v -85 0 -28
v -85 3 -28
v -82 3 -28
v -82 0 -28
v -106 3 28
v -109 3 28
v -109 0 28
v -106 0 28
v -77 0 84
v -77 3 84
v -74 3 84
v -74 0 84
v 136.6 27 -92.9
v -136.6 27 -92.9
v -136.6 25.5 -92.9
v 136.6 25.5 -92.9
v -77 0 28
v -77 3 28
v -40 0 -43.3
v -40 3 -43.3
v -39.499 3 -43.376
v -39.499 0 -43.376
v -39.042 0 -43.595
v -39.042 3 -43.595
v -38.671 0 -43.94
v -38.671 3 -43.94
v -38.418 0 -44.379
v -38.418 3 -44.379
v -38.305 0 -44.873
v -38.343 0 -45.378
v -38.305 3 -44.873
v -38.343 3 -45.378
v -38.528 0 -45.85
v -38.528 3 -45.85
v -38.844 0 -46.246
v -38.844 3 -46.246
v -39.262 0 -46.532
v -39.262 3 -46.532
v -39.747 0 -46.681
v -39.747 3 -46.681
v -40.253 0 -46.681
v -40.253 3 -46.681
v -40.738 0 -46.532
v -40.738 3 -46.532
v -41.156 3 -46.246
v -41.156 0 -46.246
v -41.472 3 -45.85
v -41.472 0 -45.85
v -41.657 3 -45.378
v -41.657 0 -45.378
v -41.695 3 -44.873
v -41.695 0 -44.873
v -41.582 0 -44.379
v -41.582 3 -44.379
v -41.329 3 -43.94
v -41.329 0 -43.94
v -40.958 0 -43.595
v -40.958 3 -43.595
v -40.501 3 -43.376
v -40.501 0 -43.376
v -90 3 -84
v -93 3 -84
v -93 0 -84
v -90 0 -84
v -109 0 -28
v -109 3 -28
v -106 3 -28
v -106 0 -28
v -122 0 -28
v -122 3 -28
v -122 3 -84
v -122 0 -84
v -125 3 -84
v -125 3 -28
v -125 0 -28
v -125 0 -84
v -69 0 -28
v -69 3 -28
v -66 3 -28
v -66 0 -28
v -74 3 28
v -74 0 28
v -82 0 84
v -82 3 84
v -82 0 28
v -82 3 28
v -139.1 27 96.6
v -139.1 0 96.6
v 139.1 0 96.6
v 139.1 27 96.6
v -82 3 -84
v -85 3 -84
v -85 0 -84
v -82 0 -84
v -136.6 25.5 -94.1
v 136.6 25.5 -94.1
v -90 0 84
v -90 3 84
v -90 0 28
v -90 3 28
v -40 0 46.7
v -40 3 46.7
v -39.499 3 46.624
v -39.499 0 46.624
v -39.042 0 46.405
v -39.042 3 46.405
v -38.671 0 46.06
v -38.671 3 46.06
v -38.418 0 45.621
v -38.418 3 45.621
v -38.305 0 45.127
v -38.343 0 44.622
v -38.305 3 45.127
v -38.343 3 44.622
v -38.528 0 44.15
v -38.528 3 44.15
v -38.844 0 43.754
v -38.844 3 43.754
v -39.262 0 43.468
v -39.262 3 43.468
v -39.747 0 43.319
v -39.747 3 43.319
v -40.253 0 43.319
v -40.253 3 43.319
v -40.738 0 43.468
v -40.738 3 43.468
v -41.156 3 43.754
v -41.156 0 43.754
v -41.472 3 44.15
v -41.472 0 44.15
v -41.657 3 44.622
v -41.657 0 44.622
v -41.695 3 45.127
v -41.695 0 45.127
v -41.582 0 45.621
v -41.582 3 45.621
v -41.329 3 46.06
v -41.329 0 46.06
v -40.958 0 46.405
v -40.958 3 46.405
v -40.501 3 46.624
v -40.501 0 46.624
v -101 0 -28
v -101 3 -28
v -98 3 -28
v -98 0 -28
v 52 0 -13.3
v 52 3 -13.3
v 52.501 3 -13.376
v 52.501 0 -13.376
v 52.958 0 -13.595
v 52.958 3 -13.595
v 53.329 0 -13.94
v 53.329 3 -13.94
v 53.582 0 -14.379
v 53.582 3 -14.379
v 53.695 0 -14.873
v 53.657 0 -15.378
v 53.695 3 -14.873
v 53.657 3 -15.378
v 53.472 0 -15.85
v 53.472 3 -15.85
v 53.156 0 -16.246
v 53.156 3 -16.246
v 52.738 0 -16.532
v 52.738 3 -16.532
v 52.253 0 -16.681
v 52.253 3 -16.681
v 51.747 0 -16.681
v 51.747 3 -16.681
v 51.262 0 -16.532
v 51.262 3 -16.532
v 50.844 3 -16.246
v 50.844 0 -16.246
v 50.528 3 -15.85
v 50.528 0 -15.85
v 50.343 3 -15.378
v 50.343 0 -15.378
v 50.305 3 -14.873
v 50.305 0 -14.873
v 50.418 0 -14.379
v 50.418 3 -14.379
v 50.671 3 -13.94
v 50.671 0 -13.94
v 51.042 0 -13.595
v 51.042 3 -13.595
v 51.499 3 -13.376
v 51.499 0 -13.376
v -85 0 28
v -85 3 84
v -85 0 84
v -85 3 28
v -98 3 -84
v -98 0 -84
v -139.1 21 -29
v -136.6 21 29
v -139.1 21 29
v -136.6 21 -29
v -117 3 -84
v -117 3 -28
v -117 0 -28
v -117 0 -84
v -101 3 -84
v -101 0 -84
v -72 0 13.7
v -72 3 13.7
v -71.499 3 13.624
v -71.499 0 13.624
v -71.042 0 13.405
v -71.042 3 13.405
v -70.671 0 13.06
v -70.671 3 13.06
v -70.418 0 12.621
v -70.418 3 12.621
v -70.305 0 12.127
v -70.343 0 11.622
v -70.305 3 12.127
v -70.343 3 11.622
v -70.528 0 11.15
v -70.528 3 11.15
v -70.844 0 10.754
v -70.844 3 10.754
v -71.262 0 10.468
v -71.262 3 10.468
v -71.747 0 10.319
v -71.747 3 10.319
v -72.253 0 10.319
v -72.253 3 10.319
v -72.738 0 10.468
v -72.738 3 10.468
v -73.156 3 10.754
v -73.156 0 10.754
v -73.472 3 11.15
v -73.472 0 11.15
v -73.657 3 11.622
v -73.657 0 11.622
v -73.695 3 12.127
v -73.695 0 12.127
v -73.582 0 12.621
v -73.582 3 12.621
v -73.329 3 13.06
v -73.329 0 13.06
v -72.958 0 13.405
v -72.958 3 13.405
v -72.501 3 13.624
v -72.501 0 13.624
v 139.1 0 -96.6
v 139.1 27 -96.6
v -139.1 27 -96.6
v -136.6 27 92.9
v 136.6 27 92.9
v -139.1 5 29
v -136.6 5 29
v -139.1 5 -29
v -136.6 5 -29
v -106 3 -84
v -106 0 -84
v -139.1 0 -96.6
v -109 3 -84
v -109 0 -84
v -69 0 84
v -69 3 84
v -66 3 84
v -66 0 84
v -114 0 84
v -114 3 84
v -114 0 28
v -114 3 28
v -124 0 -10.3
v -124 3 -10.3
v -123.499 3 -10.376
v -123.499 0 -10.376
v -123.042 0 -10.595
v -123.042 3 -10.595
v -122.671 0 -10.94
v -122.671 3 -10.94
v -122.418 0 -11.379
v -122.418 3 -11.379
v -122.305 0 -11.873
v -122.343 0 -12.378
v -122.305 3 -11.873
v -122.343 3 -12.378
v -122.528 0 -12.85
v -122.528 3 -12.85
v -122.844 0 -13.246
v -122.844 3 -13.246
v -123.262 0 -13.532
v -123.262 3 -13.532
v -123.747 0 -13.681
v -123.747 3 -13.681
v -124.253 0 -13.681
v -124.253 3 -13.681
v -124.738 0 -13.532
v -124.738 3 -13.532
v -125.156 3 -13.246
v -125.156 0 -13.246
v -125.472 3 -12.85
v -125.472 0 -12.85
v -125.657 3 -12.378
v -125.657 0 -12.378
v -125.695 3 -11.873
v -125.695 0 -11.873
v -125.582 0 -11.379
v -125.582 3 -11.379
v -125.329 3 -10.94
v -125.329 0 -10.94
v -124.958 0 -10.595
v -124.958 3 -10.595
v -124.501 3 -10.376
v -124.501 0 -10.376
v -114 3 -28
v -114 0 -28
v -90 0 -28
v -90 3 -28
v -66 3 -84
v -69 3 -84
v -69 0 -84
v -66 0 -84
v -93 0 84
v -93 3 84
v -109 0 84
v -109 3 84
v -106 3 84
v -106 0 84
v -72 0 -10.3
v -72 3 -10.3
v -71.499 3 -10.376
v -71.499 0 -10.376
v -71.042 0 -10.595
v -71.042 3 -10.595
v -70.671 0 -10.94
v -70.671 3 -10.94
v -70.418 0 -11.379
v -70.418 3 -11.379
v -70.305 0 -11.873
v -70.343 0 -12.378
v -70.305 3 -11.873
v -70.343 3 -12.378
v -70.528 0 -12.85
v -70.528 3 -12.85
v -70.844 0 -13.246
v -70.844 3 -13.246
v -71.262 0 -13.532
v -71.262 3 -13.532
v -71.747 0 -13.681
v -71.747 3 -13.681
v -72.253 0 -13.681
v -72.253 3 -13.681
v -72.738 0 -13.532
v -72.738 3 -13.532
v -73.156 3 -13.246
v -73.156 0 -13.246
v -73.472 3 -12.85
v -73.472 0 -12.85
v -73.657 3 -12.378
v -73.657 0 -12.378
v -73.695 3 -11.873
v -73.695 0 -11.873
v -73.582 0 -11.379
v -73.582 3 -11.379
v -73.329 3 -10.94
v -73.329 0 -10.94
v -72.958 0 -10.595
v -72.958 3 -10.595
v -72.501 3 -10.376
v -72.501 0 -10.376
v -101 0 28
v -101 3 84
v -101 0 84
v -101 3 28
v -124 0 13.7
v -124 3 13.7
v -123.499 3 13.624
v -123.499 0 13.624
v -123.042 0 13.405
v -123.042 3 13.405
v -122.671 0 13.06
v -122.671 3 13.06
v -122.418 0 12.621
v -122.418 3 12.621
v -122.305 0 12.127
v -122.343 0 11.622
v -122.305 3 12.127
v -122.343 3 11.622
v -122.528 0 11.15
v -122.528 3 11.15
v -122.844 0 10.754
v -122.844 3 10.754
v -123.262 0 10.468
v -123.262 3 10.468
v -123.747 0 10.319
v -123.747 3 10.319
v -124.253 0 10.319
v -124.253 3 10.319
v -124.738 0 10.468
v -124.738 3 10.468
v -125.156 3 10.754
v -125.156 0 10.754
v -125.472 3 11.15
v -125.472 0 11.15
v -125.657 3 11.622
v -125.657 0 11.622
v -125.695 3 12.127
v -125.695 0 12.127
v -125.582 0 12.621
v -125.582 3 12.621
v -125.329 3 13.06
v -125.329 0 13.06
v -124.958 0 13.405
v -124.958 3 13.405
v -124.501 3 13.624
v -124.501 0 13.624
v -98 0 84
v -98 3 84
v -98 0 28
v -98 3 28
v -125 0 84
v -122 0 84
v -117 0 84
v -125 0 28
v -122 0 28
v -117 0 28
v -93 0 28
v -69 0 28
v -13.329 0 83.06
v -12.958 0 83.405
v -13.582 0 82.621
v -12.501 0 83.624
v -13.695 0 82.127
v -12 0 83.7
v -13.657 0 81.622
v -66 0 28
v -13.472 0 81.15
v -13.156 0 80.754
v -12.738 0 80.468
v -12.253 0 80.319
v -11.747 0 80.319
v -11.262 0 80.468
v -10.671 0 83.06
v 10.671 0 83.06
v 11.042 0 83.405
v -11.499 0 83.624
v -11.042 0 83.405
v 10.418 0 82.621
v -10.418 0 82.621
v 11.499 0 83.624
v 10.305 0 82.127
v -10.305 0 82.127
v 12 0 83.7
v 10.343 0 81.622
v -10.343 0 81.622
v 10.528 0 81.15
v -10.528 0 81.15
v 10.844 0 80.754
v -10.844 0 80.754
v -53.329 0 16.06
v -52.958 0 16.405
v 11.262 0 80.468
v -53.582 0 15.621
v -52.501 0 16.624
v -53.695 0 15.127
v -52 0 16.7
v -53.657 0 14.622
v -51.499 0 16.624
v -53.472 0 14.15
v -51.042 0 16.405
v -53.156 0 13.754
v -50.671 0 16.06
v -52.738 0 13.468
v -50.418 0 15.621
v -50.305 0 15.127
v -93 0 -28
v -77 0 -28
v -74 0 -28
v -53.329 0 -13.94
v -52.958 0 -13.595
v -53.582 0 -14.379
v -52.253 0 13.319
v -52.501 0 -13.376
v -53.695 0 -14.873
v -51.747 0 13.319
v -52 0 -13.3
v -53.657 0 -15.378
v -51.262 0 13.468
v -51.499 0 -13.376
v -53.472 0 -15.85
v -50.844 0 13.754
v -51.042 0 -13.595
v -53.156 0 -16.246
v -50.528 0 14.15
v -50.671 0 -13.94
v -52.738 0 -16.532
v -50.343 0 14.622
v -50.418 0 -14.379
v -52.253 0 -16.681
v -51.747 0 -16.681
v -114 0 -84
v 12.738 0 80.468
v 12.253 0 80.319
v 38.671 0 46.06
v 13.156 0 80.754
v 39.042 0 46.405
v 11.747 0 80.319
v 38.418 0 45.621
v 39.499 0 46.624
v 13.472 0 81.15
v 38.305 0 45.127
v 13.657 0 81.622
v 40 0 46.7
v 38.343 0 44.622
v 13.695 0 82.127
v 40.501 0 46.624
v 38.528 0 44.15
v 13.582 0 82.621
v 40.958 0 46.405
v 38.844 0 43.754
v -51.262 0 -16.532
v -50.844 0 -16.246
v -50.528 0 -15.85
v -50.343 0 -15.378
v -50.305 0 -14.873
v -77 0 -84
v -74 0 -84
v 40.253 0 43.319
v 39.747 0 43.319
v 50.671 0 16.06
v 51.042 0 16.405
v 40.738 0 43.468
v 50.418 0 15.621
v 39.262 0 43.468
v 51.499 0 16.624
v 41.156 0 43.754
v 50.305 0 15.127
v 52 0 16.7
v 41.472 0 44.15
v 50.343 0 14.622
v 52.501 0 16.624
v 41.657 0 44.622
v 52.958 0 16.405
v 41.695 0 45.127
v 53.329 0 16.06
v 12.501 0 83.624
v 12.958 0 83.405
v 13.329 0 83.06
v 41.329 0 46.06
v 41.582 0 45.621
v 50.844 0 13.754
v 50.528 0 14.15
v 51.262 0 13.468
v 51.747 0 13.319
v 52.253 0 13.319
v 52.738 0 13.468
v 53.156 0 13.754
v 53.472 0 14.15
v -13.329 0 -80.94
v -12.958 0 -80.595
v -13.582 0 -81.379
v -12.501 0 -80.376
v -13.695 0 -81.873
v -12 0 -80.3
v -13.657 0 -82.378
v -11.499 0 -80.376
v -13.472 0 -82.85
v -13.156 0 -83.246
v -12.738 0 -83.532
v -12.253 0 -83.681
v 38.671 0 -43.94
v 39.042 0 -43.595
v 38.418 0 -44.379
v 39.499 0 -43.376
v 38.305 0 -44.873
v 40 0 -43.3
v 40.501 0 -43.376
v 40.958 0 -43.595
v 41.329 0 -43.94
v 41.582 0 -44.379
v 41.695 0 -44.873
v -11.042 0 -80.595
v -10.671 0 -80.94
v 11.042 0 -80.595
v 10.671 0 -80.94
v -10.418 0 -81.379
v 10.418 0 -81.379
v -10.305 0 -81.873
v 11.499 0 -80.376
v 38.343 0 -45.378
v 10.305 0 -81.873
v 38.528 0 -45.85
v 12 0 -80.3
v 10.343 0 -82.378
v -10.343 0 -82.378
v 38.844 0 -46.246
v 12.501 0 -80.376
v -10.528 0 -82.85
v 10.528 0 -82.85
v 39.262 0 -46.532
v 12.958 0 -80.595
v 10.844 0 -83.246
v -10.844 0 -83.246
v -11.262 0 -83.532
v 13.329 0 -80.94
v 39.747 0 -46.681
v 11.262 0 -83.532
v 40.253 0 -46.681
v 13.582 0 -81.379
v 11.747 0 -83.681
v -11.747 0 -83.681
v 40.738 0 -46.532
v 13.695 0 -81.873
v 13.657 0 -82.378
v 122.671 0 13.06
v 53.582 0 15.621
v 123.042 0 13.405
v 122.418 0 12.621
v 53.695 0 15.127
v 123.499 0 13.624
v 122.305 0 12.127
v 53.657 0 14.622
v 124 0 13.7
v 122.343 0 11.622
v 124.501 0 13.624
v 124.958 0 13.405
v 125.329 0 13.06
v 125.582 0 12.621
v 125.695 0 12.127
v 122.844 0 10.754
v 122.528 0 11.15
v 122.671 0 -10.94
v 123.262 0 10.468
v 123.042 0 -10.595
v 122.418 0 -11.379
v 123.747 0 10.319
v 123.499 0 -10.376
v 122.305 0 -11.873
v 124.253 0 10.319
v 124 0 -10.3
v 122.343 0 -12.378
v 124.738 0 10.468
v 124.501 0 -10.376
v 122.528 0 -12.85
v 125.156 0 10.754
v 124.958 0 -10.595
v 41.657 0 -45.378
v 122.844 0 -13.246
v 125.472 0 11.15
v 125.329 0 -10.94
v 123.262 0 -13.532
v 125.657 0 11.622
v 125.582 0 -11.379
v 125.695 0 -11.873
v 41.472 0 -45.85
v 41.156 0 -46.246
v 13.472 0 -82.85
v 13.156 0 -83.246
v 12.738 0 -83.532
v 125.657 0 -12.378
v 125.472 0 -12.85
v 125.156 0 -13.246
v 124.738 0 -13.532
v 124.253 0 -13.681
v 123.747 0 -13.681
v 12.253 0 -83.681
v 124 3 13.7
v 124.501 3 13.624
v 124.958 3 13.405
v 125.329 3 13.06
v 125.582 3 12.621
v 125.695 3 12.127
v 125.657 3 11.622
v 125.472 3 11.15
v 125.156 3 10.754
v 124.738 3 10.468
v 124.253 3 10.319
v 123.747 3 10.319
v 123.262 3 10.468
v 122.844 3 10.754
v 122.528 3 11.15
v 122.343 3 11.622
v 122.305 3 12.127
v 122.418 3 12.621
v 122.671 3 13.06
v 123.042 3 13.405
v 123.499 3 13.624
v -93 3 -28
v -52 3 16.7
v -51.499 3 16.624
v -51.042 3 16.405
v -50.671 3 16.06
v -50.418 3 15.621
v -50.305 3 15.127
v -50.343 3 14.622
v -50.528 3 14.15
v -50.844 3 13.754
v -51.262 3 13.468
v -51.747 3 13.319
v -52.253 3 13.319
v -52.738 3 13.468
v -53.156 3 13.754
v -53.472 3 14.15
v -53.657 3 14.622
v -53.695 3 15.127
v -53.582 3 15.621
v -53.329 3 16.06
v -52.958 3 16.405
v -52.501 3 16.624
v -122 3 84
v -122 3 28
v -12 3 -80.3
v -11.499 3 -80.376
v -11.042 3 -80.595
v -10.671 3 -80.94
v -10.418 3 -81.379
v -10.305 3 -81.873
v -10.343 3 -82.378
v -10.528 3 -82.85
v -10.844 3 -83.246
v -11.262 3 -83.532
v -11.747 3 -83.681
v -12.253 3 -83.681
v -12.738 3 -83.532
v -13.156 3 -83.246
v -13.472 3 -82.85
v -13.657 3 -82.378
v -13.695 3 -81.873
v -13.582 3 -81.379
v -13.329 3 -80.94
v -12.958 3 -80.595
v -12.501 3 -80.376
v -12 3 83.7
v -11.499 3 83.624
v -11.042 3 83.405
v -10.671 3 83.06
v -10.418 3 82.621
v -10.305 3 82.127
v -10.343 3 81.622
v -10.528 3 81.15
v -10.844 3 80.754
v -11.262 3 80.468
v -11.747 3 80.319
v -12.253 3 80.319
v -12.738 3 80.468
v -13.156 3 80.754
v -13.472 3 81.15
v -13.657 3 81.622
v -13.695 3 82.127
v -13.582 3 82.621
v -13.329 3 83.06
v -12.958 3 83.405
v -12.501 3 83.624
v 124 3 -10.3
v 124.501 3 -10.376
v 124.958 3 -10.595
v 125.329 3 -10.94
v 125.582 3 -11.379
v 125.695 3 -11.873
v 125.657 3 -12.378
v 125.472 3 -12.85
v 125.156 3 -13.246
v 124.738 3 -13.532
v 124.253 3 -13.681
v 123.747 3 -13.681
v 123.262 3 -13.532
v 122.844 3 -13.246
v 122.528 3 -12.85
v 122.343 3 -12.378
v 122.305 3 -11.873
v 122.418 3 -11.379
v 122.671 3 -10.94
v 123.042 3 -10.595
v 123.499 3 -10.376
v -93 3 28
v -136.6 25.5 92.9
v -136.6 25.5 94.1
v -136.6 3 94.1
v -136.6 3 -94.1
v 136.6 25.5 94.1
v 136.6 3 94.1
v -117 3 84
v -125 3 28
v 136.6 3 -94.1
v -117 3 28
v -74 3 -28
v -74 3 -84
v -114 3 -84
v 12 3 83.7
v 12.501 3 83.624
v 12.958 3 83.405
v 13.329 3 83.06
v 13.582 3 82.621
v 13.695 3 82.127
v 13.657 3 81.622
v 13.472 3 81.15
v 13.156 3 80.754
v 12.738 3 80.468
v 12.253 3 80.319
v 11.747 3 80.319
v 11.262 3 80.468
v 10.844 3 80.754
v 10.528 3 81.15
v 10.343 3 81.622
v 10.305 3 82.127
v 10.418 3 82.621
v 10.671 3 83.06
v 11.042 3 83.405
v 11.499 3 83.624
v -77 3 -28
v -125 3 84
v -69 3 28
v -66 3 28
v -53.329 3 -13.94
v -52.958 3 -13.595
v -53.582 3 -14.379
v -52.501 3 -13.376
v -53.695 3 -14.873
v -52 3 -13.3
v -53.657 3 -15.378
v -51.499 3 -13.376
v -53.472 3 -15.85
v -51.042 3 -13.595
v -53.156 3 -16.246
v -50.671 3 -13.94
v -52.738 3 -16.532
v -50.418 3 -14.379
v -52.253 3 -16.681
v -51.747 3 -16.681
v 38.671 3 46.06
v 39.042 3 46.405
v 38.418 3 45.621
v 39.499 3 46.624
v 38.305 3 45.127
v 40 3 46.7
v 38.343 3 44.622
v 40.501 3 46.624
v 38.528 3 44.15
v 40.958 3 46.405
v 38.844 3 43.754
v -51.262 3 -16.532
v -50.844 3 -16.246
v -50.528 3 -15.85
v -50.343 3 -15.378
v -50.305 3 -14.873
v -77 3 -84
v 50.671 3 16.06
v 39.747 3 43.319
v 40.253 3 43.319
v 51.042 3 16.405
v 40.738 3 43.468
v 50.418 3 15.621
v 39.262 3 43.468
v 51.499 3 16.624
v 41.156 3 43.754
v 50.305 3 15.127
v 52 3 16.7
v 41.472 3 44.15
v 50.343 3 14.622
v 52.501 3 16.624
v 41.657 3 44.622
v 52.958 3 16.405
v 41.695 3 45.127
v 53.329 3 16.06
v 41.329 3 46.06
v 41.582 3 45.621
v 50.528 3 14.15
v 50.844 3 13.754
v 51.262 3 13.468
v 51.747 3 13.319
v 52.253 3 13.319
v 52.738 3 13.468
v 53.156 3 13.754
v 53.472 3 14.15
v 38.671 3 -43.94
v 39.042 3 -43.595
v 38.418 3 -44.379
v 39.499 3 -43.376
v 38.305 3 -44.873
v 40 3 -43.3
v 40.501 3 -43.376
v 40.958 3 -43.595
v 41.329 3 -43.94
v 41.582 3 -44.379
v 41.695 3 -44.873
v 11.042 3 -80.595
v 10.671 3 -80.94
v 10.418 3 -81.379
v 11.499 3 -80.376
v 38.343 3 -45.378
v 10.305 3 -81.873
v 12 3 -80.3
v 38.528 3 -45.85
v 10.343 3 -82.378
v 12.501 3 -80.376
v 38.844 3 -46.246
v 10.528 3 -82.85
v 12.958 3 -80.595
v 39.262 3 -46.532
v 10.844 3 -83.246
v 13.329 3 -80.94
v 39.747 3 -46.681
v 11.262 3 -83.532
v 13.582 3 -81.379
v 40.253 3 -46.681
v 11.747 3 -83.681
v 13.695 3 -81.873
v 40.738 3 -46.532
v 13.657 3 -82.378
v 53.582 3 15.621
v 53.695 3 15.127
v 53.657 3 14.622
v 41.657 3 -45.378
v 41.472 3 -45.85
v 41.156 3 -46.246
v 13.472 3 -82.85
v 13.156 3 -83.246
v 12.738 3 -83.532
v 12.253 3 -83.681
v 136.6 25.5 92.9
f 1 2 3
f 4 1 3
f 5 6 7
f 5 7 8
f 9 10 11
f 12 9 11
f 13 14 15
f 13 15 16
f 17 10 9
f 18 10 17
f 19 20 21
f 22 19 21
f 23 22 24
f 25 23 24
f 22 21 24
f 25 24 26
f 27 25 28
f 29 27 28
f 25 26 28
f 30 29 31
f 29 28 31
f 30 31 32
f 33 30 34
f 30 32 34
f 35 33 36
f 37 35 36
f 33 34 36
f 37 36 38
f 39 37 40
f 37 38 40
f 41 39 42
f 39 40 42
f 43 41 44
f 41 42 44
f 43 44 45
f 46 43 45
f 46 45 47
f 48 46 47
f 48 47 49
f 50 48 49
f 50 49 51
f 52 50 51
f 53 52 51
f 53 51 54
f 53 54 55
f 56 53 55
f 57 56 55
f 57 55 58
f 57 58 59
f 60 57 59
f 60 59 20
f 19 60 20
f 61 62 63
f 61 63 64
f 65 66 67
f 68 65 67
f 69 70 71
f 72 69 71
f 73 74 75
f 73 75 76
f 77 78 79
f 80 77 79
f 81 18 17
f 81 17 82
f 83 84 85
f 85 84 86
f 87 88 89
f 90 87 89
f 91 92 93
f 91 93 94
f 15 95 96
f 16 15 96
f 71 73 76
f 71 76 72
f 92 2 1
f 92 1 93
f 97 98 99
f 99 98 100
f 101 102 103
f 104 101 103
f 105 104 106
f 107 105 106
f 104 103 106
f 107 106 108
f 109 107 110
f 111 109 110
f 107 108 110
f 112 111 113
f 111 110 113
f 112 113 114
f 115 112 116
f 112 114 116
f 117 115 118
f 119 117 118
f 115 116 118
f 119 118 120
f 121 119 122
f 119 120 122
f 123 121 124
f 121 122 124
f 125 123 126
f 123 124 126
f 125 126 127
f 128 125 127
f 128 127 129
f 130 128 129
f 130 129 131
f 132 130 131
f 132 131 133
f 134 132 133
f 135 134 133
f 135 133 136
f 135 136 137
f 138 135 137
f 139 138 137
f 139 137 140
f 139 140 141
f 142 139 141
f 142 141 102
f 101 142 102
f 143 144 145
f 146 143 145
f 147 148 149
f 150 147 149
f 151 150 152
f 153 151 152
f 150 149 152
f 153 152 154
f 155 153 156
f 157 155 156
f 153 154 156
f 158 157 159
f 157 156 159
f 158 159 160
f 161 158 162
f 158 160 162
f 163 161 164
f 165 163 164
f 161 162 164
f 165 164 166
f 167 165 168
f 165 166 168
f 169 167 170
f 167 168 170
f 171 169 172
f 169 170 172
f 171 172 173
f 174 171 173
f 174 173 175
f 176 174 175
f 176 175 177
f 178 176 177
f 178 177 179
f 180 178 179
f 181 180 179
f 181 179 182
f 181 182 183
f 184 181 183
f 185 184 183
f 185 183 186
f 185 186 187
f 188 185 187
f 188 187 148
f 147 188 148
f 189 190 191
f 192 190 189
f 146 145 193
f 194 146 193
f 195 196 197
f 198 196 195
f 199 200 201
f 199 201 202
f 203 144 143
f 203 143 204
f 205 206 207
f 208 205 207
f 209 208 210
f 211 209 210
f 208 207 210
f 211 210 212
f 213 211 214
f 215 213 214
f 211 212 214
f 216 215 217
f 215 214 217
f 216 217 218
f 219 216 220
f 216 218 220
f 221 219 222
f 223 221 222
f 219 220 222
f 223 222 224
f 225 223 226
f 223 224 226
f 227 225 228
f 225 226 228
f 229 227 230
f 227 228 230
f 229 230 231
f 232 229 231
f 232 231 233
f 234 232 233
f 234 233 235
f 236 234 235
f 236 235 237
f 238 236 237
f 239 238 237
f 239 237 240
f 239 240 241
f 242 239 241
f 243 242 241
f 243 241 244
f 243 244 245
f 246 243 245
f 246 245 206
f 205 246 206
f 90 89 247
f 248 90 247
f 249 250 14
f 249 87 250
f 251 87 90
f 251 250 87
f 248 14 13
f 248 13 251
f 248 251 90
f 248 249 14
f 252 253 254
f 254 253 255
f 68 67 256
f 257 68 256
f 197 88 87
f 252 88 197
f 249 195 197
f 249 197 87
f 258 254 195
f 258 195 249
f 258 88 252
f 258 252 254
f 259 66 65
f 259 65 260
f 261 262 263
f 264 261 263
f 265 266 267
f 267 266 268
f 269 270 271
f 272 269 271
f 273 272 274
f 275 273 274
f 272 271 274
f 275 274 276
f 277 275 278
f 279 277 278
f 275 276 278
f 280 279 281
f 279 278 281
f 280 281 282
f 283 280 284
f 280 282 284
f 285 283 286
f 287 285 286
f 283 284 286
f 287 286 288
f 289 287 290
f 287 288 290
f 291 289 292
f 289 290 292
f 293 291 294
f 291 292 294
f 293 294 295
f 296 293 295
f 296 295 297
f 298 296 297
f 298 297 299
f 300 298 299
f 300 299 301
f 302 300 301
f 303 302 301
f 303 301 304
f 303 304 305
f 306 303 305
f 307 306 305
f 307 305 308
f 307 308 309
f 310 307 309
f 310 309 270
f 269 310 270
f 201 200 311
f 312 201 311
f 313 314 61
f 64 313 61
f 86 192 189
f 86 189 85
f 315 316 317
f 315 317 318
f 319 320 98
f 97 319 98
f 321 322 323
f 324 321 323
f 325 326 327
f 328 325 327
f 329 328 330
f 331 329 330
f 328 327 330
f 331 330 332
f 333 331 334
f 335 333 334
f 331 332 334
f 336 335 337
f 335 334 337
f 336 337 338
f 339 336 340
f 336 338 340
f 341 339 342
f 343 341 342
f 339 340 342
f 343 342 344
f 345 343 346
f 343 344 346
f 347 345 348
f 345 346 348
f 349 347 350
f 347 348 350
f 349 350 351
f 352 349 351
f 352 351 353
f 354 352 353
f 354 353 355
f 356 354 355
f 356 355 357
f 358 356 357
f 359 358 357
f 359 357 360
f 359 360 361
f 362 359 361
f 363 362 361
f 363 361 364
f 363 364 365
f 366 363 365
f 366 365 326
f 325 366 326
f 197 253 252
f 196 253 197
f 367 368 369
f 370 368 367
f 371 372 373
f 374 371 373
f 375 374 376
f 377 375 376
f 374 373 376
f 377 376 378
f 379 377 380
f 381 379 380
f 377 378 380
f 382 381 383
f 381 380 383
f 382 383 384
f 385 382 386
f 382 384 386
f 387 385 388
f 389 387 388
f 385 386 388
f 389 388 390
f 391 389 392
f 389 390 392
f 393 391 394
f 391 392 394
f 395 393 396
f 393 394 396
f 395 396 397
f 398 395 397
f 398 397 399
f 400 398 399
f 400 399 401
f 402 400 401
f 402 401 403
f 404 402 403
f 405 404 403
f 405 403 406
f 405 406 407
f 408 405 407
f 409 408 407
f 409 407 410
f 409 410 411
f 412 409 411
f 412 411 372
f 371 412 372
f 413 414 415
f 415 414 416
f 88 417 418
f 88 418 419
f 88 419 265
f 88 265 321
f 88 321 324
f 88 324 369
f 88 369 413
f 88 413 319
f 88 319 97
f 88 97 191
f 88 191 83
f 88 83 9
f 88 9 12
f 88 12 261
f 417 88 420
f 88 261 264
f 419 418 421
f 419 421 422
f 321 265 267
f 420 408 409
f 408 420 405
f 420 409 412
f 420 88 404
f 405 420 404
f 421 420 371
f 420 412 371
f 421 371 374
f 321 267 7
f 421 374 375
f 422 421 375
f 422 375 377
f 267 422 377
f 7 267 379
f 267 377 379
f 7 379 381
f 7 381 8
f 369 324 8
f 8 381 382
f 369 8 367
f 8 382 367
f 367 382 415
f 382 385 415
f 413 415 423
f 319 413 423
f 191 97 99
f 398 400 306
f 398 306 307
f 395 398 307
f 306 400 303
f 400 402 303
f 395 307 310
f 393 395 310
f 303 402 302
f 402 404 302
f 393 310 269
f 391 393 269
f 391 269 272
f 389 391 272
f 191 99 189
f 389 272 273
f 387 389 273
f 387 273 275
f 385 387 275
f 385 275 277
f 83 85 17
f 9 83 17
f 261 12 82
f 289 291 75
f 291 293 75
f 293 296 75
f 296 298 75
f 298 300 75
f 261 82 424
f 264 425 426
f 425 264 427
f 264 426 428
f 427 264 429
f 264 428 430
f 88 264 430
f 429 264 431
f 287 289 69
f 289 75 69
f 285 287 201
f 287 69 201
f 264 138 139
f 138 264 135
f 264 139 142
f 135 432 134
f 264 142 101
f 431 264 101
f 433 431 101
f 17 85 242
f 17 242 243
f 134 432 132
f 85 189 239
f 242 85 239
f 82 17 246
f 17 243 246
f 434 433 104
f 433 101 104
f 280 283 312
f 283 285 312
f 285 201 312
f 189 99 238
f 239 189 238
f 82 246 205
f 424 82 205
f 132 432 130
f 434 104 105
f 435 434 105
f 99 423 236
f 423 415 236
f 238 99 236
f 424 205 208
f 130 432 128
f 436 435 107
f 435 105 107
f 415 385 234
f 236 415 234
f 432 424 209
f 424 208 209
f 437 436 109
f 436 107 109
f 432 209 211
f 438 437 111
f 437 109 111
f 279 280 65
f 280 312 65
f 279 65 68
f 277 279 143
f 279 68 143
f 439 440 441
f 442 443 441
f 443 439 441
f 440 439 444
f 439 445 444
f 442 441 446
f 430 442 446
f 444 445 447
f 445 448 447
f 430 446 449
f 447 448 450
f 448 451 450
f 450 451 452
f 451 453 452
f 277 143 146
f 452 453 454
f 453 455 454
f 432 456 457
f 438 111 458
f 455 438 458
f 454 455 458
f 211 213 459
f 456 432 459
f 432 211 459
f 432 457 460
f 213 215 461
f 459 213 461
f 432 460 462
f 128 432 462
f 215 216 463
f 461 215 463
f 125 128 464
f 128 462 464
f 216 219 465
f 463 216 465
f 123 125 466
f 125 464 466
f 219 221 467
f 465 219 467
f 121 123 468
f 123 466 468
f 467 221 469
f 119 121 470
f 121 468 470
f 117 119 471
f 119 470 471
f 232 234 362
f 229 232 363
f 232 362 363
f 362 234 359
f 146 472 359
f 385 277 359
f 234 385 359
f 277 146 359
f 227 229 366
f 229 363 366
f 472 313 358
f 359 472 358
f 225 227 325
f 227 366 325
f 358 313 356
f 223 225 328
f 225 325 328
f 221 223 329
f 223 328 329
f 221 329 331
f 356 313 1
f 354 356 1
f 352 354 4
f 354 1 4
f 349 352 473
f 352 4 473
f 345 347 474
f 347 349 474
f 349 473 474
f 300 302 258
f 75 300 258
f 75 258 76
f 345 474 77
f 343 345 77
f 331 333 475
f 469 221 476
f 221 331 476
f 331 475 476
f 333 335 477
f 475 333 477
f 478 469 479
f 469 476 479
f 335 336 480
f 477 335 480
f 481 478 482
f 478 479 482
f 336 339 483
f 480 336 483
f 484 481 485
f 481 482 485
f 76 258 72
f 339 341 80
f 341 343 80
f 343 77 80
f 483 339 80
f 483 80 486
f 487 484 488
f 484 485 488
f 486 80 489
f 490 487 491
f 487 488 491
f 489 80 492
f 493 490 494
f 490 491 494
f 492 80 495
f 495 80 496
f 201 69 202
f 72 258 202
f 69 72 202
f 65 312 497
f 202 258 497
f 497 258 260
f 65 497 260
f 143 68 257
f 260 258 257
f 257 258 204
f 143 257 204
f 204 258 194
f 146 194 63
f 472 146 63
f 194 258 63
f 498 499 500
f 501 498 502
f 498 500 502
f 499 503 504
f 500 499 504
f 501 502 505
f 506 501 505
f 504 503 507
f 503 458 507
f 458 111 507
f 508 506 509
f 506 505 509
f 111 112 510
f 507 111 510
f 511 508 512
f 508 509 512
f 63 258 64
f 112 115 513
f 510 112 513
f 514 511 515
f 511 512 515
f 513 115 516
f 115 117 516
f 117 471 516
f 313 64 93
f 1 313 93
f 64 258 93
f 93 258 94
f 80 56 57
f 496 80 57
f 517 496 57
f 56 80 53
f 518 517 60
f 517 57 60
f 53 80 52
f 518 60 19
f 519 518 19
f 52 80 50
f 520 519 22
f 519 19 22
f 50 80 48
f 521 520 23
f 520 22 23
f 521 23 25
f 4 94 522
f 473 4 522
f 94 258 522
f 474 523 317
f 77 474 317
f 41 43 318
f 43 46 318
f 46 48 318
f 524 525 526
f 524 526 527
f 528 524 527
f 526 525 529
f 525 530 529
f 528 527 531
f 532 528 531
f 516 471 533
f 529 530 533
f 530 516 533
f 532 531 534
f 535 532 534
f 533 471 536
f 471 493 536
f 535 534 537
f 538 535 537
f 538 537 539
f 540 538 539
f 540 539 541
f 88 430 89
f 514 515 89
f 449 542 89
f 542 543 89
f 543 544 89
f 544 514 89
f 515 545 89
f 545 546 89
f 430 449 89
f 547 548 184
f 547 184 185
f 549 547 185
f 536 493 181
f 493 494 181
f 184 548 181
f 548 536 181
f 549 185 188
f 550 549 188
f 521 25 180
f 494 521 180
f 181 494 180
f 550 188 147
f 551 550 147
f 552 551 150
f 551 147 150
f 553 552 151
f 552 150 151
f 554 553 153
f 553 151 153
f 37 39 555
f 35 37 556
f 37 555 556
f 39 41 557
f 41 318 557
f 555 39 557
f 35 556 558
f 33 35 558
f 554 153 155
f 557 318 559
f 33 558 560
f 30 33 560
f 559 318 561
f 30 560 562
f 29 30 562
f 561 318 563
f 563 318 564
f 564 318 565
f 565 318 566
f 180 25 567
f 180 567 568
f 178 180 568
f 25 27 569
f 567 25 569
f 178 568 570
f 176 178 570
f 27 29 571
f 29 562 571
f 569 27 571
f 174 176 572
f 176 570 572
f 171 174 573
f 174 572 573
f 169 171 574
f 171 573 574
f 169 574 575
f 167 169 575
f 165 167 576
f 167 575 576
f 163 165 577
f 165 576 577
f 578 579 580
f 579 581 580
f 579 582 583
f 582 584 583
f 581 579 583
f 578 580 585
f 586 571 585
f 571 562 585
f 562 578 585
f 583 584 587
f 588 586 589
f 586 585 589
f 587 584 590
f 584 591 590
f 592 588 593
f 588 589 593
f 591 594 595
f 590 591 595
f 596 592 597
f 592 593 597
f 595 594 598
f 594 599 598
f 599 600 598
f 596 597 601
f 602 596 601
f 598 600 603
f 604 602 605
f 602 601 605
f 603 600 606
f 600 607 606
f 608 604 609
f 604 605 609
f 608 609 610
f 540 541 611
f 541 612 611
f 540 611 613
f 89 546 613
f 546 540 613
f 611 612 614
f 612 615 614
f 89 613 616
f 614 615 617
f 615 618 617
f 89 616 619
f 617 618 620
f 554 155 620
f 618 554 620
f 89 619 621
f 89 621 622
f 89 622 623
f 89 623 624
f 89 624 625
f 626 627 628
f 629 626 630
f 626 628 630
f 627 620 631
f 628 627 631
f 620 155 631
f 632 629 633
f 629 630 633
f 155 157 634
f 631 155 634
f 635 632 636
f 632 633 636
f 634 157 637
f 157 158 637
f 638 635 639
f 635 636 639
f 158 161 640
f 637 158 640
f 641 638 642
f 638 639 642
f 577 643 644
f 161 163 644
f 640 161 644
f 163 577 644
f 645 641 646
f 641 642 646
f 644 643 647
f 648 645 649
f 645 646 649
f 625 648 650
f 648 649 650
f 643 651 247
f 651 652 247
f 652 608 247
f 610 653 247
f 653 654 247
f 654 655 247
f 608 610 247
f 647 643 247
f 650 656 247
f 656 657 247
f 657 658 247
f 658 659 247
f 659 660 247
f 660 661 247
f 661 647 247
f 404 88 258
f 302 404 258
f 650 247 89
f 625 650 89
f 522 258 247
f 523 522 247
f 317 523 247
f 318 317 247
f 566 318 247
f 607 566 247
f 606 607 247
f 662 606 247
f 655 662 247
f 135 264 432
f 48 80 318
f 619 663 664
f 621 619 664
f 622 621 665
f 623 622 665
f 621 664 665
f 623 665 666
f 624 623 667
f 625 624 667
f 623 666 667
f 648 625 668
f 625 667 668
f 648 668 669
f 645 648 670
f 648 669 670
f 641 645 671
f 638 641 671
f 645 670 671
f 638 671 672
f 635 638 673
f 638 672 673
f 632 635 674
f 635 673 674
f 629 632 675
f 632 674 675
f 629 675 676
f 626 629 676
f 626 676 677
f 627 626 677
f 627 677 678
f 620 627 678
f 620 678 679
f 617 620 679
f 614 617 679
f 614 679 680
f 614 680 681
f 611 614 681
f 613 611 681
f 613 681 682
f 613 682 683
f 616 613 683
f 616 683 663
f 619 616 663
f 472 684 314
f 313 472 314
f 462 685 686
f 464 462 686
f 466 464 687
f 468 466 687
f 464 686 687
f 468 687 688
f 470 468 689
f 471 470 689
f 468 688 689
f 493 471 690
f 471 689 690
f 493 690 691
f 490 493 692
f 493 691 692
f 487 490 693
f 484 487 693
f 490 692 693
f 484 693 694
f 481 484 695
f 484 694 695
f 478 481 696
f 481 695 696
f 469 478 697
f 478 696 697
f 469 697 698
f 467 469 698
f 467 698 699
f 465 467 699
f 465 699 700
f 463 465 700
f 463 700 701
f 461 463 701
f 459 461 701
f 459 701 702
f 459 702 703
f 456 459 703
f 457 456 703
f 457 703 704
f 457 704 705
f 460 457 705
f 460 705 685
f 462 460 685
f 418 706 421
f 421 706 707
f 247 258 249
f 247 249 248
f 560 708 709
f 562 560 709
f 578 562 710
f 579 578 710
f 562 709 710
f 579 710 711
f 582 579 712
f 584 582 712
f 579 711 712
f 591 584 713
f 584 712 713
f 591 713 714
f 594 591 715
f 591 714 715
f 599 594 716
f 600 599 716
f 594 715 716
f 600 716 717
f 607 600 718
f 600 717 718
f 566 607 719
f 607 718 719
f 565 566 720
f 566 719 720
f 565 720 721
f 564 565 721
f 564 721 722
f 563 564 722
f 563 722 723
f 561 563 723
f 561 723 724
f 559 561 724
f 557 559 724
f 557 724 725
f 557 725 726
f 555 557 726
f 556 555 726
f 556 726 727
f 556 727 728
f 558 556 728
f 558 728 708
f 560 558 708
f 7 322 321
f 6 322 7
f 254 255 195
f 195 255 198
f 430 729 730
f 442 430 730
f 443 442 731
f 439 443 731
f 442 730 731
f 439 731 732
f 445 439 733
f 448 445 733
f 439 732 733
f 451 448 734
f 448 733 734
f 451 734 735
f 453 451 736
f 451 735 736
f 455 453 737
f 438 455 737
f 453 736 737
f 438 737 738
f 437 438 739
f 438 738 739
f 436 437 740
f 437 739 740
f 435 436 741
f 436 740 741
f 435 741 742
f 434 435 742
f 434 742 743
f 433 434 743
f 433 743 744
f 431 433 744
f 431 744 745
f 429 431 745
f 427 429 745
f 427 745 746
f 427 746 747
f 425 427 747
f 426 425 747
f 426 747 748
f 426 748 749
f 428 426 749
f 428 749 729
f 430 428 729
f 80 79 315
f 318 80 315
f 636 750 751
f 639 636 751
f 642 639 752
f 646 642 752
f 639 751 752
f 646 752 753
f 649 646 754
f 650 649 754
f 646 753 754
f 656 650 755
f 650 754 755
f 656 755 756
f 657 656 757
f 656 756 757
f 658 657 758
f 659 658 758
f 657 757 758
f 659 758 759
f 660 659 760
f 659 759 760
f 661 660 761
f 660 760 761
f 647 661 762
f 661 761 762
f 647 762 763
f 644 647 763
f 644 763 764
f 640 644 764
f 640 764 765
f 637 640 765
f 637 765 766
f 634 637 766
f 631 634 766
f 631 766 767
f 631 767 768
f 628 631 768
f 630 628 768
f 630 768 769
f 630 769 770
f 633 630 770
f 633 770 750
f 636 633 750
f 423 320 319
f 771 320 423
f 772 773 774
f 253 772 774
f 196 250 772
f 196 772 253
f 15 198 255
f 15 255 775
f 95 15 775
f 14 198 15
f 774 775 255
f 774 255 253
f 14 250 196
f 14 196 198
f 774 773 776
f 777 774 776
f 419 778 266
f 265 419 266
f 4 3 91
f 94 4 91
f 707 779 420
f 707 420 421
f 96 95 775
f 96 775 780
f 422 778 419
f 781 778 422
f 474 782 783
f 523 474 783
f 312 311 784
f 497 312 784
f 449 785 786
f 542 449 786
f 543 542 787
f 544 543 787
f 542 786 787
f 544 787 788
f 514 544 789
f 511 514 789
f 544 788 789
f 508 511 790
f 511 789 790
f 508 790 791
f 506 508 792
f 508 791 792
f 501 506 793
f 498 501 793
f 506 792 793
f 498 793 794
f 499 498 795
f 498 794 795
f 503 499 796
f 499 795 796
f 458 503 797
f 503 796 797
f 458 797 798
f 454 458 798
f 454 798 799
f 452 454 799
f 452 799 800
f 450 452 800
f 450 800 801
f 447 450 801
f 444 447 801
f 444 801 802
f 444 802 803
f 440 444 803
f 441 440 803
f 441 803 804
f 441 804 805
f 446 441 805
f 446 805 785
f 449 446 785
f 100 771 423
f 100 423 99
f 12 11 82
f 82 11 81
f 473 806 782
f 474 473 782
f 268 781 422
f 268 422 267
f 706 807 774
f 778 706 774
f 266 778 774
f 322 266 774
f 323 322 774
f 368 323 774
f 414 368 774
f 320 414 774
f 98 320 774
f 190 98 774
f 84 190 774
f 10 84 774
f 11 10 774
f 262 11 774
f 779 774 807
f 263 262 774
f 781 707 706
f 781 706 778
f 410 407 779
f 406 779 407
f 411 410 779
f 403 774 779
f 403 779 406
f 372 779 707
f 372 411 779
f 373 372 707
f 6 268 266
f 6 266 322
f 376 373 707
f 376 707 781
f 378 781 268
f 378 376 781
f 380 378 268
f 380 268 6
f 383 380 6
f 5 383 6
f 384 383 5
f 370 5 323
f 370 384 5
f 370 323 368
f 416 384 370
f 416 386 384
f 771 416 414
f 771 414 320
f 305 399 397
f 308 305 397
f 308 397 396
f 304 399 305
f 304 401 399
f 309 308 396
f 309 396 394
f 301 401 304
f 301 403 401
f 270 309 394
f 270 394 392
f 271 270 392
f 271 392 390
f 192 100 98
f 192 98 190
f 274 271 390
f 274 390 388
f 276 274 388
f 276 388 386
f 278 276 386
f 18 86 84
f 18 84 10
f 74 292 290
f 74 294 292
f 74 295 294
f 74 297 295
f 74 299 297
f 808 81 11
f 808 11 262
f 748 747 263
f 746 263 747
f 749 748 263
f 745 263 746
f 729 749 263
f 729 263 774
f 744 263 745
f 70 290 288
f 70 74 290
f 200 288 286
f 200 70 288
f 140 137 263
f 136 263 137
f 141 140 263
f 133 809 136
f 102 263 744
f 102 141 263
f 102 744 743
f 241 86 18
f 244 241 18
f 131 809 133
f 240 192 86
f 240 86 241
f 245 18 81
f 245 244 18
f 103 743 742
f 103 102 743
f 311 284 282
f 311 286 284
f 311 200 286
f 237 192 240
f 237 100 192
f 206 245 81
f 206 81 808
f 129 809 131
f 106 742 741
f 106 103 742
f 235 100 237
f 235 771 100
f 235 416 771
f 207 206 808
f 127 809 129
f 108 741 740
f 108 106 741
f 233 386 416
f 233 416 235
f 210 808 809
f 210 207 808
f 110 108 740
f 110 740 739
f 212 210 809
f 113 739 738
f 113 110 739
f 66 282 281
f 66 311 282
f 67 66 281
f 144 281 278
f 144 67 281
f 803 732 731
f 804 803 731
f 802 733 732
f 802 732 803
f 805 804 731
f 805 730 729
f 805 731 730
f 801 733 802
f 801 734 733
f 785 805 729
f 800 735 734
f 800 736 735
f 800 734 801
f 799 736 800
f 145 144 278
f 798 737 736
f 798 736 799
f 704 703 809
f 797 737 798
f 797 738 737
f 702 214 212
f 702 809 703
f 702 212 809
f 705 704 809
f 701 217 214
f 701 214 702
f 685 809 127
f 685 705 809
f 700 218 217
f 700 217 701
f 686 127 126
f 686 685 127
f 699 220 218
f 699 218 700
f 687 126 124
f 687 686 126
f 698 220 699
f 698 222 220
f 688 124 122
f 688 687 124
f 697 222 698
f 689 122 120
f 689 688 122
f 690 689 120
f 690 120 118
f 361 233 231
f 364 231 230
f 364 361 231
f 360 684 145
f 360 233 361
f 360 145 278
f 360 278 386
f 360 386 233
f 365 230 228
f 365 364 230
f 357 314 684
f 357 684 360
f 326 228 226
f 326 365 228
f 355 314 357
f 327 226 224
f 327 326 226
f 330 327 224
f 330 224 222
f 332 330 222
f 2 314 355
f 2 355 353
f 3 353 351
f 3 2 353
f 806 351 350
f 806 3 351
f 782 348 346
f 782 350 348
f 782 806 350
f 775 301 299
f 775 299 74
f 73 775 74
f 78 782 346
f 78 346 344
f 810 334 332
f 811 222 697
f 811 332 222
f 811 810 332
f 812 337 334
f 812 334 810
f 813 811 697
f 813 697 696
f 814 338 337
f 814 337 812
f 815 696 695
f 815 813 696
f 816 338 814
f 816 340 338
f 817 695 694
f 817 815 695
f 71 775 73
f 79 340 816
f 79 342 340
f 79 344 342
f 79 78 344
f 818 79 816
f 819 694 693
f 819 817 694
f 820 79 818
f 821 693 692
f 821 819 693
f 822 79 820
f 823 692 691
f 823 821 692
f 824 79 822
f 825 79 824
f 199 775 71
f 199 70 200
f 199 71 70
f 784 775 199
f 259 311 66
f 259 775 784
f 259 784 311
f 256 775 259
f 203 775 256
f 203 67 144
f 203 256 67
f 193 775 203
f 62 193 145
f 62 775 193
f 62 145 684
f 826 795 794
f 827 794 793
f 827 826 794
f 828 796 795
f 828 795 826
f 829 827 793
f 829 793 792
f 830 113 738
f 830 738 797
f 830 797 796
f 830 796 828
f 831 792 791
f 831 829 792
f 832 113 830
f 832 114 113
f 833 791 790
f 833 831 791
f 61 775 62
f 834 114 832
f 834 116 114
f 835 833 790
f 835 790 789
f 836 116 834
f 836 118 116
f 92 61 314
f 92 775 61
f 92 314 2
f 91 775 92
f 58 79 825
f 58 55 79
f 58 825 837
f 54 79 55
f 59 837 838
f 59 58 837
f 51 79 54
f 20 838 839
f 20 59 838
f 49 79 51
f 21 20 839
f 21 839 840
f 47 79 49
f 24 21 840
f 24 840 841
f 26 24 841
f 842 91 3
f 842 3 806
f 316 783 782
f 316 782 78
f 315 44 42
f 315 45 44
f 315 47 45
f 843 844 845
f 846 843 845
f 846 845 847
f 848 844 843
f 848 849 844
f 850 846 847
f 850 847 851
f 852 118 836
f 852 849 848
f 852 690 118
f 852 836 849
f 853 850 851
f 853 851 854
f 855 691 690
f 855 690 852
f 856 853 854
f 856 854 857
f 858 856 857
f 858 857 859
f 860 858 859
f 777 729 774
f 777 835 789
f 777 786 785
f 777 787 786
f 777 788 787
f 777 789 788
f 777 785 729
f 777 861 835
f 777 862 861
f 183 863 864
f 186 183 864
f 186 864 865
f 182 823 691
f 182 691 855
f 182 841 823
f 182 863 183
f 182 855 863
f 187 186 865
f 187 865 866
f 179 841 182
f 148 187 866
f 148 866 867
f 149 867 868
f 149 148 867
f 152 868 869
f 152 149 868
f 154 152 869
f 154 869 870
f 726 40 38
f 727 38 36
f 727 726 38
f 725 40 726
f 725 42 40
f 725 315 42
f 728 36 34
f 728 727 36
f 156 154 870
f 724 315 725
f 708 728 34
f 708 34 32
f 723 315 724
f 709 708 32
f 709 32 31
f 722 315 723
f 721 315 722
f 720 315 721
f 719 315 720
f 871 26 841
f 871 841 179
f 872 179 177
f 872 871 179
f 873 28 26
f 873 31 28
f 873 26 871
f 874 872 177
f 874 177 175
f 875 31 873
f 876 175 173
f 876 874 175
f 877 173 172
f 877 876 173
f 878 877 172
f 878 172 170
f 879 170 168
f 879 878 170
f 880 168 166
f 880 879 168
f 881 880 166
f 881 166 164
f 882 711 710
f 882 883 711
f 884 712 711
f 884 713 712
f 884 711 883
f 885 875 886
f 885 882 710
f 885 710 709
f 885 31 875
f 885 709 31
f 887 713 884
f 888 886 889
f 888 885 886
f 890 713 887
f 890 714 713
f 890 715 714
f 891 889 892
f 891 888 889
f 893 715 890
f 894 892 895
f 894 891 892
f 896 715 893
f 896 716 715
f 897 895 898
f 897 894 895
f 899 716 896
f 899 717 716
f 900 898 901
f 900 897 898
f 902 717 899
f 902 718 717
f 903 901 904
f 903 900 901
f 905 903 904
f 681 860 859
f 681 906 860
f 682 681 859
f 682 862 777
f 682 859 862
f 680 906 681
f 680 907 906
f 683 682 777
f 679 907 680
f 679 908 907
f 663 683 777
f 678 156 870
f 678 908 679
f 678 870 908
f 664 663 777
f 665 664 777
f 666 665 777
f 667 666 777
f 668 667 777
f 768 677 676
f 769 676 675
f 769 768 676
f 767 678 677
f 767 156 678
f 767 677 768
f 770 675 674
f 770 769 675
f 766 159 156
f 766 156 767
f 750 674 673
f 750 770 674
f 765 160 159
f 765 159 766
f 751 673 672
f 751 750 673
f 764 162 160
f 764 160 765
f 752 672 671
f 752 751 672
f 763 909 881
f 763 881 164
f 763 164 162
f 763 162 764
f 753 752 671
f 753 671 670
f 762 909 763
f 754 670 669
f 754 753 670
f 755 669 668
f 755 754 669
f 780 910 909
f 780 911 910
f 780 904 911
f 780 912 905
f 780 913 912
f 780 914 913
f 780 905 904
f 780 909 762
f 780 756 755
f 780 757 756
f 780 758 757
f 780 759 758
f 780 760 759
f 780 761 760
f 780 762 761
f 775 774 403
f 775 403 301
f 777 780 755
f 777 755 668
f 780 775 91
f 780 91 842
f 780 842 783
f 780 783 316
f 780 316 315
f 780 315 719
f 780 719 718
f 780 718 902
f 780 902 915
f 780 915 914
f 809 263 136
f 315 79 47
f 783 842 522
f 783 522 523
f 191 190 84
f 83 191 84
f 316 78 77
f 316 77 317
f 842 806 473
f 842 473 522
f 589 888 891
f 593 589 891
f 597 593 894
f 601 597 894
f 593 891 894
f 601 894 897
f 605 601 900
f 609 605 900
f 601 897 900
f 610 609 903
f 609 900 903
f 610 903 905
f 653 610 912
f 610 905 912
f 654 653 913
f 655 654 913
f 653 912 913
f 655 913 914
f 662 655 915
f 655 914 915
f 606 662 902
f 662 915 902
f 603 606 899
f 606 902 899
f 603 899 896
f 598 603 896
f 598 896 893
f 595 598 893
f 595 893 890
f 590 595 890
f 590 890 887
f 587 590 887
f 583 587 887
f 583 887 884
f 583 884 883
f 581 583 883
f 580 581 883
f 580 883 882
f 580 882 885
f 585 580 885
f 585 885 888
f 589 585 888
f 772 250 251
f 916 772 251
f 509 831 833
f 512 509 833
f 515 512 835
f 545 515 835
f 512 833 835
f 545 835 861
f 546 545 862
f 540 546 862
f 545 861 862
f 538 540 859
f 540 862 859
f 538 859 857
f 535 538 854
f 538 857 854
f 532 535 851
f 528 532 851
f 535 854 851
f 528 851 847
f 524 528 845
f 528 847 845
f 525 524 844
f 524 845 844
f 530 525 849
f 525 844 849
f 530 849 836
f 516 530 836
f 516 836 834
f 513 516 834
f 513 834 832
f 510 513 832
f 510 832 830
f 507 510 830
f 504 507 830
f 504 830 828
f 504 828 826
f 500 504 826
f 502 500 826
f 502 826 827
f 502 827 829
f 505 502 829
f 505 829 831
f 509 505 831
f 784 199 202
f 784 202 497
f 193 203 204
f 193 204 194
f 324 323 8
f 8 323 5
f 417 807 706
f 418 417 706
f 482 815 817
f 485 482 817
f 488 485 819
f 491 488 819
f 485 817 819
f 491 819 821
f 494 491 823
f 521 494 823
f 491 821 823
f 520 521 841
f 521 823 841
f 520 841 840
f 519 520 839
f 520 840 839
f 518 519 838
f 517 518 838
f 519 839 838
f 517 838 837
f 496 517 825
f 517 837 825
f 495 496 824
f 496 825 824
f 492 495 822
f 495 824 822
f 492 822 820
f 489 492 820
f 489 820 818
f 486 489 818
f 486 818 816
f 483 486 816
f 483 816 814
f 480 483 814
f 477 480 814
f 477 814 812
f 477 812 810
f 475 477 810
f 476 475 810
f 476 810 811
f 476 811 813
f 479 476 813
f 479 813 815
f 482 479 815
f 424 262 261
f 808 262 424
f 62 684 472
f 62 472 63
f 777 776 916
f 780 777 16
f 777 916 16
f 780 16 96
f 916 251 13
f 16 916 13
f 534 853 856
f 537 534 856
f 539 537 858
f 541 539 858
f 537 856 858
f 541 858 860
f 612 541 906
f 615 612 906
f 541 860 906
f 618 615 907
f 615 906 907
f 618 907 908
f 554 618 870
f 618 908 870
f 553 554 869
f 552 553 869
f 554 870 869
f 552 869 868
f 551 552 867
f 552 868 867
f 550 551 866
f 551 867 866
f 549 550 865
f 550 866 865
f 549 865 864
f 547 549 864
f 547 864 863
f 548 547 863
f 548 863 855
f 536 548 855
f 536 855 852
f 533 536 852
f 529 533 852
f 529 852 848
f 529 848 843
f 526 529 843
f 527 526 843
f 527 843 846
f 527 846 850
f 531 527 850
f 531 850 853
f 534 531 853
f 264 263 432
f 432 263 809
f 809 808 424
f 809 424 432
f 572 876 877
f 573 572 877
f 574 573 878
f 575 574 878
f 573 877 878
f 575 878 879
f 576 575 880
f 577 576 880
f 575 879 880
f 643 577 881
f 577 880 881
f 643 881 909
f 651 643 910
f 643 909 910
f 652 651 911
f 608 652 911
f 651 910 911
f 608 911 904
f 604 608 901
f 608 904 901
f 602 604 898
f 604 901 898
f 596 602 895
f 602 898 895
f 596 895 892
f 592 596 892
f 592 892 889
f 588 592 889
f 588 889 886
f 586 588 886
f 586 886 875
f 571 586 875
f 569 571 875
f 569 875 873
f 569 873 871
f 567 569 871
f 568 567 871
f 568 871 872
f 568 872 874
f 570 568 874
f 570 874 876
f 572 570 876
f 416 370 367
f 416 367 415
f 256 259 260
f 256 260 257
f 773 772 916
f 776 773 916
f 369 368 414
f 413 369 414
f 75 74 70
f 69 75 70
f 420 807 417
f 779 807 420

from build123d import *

# Parameters (mm, degrees)
SKETCH1_W                     = 278.2
SKETCH1_H                     = 193.2
SHELL_BLOCK_DEPTH             = 27
SKETCH2_W                     = 273.2
SKETCH2_H                     = 185.8
FRONT_OPENING_DEPTH           = 1.5
SKETCH3_W                     = 273.2
SKETCH3_H                     = 188.2
DISPLAY_POCKET_DEPTH          = 22.5
SKETCH4_W                     = 3
SKETCH4_H                     = 56
VENT_SLOTS_DEPTH              = 4
SKETCH5_W                     = 58
SKETCH5_H                     = 16
CABLE_EXIT_X_SHORT_SIDE_DEPTH = 140.1
SKETCH6_R                     = 1.7
BOLT_HOLES_DEPTH              = 4


with BuildPart() as part:
    # Sketch1 → Shell Block (new body)
    with BuildSketch(Plane(origin=(0, 0, 0), x_dir=(1, 0, 0), z_dir=(0, 1, 0))):
        Rectangle(SKETCH1_W, SKETCH1_H)
    extrude(amount=SHELL_BLOCK_DEPTH)

    # Sketch2 → Front Opening (cut)
    with BuildSketch(Plane(origin=(0, 27, 0), x_dir=(1, 0, 0), z_dir=(0, 1, 0))):
        Rectangle(SKETCH2_W, SKETCH2_H)
    extrude(amount=-FRONT_OPENING_DEPTH, mode=Mode.SUBTRACT)

    # Sketch3 → Display Pocket (cut)
    with BuildSketch(Plane(origin=(0, 25.5, 0), x_dir=(1, 0, 0), z_dir=(0, 1, 0))):
        Rectangle(SKETCH3_W, SKETCH3_H)
    extrude(amount=-DISPLAY_POCKET_DEPTH, mode=Mode.SUBTRACT)

    # Sketch4 → Vent Slots (cut)
    with BuildSketch(Plane(origin=(0, 3, 0), x_dir=(1, 0, 0), z_dir=(0, 1, 0))):
        with Locations((-67.5, 56)):
            Rectangle(SKETCH4_W, SKETCH4_H)
        with Locations((-67.5, -56)):
            Rectangle(SKETCH4_W, SKETCH4_H)
        with Locations((-75.5, 56)):
            Rectangle(SKETCH4_W, SKETCH4_H)
        with Locations((-75.5, -56)):
            Rectangle(SKETCH4_W, SKETCH4_H)
        with Locations((-83.5, 56)):
            Rectangle(SKETCH4_W, SKETCH4_H)
        with Locations((-83.5, -56)):
            Rectangle(SKETCH4_W, SKETCH4_H)
        with Locations((-91.5, 56)):
            Rectangle(SKETCH4_W, SKETCH4_H)
        with Locations((-91.5, -56)):
            Rectangle(SKETCH4_W, SKETCH4_H)
        with Locations((-99.5, 56)):
            Rectangle(SKETCH4_W, SKETCH4_H)
        with Locations((-99.5, -56)):
            Rectangle(SKETCH4_W, SKETCH4_H)
        with Locations((-107.5, 56)):
            Rectangle(SKETCH4_W, SKETCH4_H)
        with Locations((-107.5, -56)):
            Rectangle(SKETCH4_W, SKETCH4_H)
        with Locations((-115.5, 56)):
            Rectangle(SKETCH4_W, SKETCH4_H)
        with Locations((-115.5, -56)):
            Rectangle(SKETCH4_W, SKETCH4_H)
        with Locations((-123.5, 56)):
            Rectangle(SKETCH4_W, SKETCH4_H)
        with Locations((-123.5, -56)):
            Rectangle(SKETCH4_W, SKETCH4_H)
    extrude(amount=-VENT_SLOTS_DEPTH, mode=Mode.SUBTRACT)

    # Sketch5 → Cable Exit (-X short side) (cut)
    with BuildSketch(Plane(origin=(0, 0, 0), x_dir=(0, 0, -1), z_dir=(1, 0, 0))):
        with Locations((0, 13)):
            Rectangle(SKETCH5_W, SKETCH5_H)
    extrude(amount=-CABLE_EXIT_X_SHORT_SIDE_DEPTH, mode=Mode.SUBTRACT)

    # Sketch6 → Bolt Holes (cut)
    with BuildSketch(Plane(origin=(0, 3, 0), x_dir=(1, 0, 0), z_dir=(0, 1, 0))):
        with Locations(Location((-40, -45, 0), (0, 0, 270))):
            Circle(SKETCH6_R)
        with Locations(Location((-40, 45, 0), (0, 0, 270))):
            Circle(SKETCH6_R)
        with Locations(Location((40, -45, 0), (0, 0, 270))):
            Circle(SKETCH6_R)
        with Locations(Location((40, 45, 0), (0, 0, 270))):
            Circle(SKETCH6_R)
        with Locations(Location((-52, -15, 0), (0, 0, 270))):
            Circle(SKETCH6_R)
        with Locations(Location((-52, 15, 0), (0, 0, 270))):
            Circle(SKETCH6_R)
        with Locations(Location((52, -15, 0), (0, 0, 270))):
            Circle(SKETCH6_R)
        with Locations(Location((52, 15, 0), (0, 0, 270))):
            Circle(SKETCH6_R)
        with Locations(Location((-12, -82, 0), (0, 0, 270))):
            Circle(SKETCH6_R)
        with Locations(Location((-12, 82, 0), (0, 0, 270))):
            Circle(SKETCH6_R)
        with Locations(Location((12, -82, 0), (0, 0, 270))):
            Circle(SKETCH6_R)
        with Locations(Location((12, 82, 0), (0, 0, 270))):
            Circle(SKETCH6_R)
        with Locations(Location((-124, -12, 0), (0, 0, 270))):
            Circle(SKETCH6_R)
        with Locations(Location((-124, 12, 0), (0, 0, 270))):
            Circle(SKETCH6_R)
        with Locations(Location((124, -12, 0), (0, 0, 270))):
            Circle(SKETCH6_R)
        with Locations(Location((124, 12, 0), (0, 0, 270))):
            Circle(SKETCH6_R)
        with Locations(Location((-72, 12, 0), (0, 0, 270))):
            Circle(SKETCH6_R)
        with Locations(Location((-72, -12, 0), (0, 0, 270))):
            Circle(SKETCH6_R)
    extrude(amount=-BOLT_HOLES_DEPTH, mode=Mode.SUBTRACT)


solid = part.part
